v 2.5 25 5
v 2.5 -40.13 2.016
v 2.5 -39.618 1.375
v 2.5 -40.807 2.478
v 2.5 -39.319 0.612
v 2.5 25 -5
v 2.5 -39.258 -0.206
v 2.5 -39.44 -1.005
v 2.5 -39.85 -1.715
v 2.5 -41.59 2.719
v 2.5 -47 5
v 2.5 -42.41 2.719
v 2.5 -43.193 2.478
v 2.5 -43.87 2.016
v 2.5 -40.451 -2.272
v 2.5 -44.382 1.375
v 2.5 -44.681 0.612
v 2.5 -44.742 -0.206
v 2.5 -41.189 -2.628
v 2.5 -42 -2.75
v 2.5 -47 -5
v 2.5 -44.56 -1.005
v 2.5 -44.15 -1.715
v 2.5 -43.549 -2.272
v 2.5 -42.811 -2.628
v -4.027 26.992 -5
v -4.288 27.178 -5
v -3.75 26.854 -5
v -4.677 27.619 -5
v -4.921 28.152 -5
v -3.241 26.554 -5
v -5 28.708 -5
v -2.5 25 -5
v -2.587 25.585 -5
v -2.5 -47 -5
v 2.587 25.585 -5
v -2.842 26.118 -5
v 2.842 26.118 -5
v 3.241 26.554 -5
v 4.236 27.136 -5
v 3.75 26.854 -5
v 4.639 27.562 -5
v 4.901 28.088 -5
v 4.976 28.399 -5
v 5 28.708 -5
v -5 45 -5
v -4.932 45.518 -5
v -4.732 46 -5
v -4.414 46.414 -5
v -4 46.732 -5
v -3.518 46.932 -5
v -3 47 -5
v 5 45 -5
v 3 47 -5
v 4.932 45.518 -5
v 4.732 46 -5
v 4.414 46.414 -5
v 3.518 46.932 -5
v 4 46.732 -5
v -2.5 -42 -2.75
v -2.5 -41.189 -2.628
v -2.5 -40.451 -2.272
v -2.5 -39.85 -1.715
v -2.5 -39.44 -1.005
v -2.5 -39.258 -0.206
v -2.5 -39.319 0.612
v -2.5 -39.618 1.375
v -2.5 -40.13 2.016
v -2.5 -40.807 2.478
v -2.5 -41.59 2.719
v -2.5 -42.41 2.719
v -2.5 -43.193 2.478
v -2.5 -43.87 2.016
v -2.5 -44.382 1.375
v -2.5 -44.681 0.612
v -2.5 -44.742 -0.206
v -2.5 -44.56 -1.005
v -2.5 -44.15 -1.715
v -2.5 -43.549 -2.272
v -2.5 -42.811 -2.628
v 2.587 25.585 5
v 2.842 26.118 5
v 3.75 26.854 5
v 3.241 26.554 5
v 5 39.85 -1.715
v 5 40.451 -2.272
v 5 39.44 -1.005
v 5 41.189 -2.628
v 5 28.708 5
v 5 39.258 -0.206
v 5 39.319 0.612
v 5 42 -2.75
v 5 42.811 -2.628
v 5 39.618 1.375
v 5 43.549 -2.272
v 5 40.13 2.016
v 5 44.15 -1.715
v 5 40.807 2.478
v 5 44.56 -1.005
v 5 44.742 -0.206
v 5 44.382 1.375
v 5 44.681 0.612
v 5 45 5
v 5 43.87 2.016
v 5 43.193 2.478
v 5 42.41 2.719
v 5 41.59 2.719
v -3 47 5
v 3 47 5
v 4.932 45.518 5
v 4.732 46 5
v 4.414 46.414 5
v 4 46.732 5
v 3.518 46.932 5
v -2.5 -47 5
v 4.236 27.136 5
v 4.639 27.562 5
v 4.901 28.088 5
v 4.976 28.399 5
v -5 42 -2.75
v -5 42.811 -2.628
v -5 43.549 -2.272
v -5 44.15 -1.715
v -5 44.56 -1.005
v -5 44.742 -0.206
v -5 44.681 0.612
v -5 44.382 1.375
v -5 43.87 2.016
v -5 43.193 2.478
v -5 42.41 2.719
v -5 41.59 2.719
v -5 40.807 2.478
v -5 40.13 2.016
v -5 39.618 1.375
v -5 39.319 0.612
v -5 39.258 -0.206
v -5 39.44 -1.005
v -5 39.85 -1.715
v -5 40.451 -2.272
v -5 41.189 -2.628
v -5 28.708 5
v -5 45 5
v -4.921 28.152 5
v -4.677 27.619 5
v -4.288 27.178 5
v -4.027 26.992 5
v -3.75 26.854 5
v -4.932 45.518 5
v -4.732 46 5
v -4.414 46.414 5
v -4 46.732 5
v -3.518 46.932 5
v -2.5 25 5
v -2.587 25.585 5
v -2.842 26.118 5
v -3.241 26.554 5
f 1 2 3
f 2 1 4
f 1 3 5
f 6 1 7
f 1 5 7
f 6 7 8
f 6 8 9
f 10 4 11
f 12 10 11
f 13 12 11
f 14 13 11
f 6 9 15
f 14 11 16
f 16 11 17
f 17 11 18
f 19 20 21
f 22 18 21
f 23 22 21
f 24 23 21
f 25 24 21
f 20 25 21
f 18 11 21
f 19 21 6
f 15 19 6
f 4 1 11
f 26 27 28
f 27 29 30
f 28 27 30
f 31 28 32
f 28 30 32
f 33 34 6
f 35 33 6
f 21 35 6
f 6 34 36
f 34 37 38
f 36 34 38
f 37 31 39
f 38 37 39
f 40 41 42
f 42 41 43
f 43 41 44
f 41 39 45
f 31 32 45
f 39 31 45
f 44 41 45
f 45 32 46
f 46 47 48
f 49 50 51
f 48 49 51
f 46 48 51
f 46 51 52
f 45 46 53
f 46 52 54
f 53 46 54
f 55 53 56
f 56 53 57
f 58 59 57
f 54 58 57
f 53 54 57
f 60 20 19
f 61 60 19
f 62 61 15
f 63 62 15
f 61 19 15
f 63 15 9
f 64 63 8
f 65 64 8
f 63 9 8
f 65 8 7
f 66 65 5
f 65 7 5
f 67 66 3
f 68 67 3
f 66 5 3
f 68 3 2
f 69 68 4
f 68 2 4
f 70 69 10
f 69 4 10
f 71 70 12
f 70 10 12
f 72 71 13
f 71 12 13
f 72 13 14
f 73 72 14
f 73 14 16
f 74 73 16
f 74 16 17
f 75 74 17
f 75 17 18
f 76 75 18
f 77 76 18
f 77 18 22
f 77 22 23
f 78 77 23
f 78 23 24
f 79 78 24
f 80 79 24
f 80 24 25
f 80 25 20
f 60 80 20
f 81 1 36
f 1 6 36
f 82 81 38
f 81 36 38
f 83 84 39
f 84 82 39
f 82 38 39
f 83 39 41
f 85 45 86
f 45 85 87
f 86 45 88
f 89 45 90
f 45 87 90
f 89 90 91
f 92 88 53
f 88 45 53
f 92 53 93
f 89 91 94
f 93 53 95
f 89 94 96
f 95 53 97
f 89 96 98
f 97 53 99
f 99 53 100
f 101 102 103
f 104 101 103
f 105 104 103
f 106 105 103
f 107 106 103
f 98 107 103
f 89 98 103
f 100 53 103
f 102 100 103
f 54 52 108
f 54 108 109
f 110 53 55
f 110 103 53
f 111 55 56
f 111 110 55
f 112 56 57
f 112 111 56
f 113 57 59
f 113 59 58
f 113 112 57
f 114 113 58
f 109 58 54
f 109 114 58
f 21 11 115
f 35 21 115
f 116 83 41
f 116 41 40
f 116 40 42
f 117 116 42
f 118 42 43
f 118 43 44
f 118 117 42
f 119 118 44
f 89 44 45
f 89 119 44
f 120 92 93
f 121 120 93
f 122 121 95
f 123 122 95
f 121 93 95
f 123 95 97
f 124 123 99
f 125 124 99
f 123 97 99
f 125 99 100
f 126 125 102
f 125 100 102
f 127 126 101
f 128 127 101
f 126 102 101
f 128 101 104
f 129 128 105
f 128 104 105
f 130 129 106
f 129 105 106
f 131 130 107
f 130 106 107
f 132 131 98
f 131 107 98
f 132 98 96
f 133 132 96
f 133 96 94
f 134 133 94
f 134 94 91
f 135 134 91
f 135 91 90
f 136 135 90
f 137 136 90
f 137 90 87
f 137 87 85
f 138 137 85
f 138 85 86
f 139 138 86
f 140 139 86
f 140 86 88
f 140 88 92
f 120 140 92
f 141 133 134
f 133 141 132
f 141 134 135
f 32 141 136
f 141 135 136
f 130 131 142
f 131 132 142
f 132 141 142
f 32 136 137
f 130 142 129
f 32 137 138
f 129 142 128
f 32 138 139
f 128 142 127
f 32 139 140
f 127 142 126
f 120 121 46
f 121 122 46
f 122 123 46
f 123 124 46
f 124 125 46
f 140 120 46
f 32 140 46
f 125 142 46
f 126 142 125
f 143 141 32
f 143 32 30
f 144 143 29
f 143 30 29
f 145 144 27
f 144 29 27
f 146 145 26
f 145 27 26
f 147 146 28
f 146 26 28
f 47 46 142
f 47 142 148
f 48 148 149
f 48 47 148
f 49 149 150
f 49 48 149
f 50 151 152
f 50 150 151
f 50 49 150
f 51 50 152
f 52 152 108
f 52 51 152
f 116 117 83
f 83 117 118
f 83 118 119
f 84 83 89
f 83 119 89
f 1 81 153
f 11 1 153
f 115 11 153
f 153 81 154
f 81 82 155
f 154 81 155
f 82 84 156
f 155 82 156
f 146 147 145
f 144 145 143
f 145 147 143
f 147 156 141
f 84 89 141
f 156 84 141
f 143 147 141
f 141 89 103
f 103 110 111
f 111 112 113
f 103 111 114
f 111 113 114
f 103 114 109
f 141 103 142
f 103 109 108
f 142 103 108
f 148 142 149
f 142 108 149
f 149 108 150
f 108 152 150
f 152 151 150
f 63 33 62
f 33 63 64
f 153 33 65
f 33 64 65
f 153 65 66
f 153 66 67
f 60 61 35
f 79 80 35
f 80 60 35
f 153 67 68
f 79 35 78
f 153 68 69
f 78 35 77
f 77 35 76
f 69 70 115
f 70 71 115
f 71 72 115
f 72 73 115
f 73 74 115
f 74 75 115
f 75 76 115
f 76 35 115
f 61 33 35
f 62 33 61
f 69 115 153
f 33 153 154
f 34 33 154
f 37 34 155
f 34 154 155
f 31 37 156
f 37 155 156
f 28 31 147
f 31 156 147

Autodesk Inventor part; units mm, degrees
ref_plane "YZ Plane" through (0, 0, 0) normal (1, 0, 0) x (0, 1, 0)
ref_plane "XZ Plane" through (0, 0, 0) normal (0, 1, 0) x (-1, 0, 0)
ref_plane "XY Plane" through (0, 0, 0) normal (0, 0, 1) x (1, 0, 0)
sketch "Szkic1" plane through (0, 0, 0) normal (0, 1, 0) x (-1, 0, 0)
  line L0 (-2.5, -5) -> (2.5, -5)
  line L1 (2.5, -5) -> (2.5, 5)
  line L2 (2.5, 5) -> (-2.5, 5)
  line L3 (-2.5, 5) -> (-2.5, -5)
  line L4 (-2.5, -5) -> (2.5, 5) construction
  line L5 (2.5, -5) -> (-2.5, 5) construction
  point P0 (0, 0)
  dimension "d0" = 5
  dimension "d1" = 10
extrude "Wyciągnięcie proste1" add sketch "Szkic1" along normal mid plane 94
sketch "Szkic3" plane through (2.5, -47, 5) normal (1, 0, 0) x (0, 0, -1)
  circle A0 centre (5, 5) radius 2.75
  line L0 (10, 0) -> (0, 0) projected
  line L1 (10, 0) -> (10, 94) projected
  point P0 (5, 47)
  point P1 (10, 118)
  dimension "d10" = 5.5
  dimension "d11" = 5
  dimension "d12" = 5
extrude "Wyciągnięcie proste3" cut sketch "Szkic3" against normal blind 120
sketch "Szkic4" plane through (2.5, -47, -5) normal (1, 0, 0) x (0, 0, -1)
  point P0 (-5, 47)
sketch "Szkic5" plane through (0, 47, 0) normal (0, 1, 0) x (1, 0, 0)
  line L0 (5, -5) -> (-5, -5)
  line L1 (-5, -5) -> (-5, 5)
  line L2 (-5, 5) -> (5, 5)
  line L3 (5, 5) -> (5, -5)
  line L4 (5, -5) -> (-5, 5) construction
  line L5 (-5, -5) -> (5, 5) construction
  point P0 (0, 0)
  dimension "d16" = 10
  dimension "d17" = 10
extrude "Wyciągnięcie proste4" add sketch "Szkic5" against normal blind 20
sketch "Szkic6" plane through (5, 47, 5) normal (1, 0, 0) x (0, 0, -1)
  circle A0 centre (5, -5) radius 2.75
  line L0 (0, 0) -> (10, 0) projected
  line L1 (0, 0) -> (0, -20) projected
  point P0 (5, -47)
  dimension "d20" = 5.5
  dimension "d21" = 5
  dimension "d22" = 5
extrude "Wyciągnięcie proste5" cut sketch "Szkic6" against normal blind 20
fillet "Zaokrąglenie3" radius 2 6 edges at (2.5, 27, 0) (5, 27, 0) (-5, 27, 0) (-2.5, 27, 0) (-5, 47, 0) (5, 47, 0)
properties part number "element_posredni"
